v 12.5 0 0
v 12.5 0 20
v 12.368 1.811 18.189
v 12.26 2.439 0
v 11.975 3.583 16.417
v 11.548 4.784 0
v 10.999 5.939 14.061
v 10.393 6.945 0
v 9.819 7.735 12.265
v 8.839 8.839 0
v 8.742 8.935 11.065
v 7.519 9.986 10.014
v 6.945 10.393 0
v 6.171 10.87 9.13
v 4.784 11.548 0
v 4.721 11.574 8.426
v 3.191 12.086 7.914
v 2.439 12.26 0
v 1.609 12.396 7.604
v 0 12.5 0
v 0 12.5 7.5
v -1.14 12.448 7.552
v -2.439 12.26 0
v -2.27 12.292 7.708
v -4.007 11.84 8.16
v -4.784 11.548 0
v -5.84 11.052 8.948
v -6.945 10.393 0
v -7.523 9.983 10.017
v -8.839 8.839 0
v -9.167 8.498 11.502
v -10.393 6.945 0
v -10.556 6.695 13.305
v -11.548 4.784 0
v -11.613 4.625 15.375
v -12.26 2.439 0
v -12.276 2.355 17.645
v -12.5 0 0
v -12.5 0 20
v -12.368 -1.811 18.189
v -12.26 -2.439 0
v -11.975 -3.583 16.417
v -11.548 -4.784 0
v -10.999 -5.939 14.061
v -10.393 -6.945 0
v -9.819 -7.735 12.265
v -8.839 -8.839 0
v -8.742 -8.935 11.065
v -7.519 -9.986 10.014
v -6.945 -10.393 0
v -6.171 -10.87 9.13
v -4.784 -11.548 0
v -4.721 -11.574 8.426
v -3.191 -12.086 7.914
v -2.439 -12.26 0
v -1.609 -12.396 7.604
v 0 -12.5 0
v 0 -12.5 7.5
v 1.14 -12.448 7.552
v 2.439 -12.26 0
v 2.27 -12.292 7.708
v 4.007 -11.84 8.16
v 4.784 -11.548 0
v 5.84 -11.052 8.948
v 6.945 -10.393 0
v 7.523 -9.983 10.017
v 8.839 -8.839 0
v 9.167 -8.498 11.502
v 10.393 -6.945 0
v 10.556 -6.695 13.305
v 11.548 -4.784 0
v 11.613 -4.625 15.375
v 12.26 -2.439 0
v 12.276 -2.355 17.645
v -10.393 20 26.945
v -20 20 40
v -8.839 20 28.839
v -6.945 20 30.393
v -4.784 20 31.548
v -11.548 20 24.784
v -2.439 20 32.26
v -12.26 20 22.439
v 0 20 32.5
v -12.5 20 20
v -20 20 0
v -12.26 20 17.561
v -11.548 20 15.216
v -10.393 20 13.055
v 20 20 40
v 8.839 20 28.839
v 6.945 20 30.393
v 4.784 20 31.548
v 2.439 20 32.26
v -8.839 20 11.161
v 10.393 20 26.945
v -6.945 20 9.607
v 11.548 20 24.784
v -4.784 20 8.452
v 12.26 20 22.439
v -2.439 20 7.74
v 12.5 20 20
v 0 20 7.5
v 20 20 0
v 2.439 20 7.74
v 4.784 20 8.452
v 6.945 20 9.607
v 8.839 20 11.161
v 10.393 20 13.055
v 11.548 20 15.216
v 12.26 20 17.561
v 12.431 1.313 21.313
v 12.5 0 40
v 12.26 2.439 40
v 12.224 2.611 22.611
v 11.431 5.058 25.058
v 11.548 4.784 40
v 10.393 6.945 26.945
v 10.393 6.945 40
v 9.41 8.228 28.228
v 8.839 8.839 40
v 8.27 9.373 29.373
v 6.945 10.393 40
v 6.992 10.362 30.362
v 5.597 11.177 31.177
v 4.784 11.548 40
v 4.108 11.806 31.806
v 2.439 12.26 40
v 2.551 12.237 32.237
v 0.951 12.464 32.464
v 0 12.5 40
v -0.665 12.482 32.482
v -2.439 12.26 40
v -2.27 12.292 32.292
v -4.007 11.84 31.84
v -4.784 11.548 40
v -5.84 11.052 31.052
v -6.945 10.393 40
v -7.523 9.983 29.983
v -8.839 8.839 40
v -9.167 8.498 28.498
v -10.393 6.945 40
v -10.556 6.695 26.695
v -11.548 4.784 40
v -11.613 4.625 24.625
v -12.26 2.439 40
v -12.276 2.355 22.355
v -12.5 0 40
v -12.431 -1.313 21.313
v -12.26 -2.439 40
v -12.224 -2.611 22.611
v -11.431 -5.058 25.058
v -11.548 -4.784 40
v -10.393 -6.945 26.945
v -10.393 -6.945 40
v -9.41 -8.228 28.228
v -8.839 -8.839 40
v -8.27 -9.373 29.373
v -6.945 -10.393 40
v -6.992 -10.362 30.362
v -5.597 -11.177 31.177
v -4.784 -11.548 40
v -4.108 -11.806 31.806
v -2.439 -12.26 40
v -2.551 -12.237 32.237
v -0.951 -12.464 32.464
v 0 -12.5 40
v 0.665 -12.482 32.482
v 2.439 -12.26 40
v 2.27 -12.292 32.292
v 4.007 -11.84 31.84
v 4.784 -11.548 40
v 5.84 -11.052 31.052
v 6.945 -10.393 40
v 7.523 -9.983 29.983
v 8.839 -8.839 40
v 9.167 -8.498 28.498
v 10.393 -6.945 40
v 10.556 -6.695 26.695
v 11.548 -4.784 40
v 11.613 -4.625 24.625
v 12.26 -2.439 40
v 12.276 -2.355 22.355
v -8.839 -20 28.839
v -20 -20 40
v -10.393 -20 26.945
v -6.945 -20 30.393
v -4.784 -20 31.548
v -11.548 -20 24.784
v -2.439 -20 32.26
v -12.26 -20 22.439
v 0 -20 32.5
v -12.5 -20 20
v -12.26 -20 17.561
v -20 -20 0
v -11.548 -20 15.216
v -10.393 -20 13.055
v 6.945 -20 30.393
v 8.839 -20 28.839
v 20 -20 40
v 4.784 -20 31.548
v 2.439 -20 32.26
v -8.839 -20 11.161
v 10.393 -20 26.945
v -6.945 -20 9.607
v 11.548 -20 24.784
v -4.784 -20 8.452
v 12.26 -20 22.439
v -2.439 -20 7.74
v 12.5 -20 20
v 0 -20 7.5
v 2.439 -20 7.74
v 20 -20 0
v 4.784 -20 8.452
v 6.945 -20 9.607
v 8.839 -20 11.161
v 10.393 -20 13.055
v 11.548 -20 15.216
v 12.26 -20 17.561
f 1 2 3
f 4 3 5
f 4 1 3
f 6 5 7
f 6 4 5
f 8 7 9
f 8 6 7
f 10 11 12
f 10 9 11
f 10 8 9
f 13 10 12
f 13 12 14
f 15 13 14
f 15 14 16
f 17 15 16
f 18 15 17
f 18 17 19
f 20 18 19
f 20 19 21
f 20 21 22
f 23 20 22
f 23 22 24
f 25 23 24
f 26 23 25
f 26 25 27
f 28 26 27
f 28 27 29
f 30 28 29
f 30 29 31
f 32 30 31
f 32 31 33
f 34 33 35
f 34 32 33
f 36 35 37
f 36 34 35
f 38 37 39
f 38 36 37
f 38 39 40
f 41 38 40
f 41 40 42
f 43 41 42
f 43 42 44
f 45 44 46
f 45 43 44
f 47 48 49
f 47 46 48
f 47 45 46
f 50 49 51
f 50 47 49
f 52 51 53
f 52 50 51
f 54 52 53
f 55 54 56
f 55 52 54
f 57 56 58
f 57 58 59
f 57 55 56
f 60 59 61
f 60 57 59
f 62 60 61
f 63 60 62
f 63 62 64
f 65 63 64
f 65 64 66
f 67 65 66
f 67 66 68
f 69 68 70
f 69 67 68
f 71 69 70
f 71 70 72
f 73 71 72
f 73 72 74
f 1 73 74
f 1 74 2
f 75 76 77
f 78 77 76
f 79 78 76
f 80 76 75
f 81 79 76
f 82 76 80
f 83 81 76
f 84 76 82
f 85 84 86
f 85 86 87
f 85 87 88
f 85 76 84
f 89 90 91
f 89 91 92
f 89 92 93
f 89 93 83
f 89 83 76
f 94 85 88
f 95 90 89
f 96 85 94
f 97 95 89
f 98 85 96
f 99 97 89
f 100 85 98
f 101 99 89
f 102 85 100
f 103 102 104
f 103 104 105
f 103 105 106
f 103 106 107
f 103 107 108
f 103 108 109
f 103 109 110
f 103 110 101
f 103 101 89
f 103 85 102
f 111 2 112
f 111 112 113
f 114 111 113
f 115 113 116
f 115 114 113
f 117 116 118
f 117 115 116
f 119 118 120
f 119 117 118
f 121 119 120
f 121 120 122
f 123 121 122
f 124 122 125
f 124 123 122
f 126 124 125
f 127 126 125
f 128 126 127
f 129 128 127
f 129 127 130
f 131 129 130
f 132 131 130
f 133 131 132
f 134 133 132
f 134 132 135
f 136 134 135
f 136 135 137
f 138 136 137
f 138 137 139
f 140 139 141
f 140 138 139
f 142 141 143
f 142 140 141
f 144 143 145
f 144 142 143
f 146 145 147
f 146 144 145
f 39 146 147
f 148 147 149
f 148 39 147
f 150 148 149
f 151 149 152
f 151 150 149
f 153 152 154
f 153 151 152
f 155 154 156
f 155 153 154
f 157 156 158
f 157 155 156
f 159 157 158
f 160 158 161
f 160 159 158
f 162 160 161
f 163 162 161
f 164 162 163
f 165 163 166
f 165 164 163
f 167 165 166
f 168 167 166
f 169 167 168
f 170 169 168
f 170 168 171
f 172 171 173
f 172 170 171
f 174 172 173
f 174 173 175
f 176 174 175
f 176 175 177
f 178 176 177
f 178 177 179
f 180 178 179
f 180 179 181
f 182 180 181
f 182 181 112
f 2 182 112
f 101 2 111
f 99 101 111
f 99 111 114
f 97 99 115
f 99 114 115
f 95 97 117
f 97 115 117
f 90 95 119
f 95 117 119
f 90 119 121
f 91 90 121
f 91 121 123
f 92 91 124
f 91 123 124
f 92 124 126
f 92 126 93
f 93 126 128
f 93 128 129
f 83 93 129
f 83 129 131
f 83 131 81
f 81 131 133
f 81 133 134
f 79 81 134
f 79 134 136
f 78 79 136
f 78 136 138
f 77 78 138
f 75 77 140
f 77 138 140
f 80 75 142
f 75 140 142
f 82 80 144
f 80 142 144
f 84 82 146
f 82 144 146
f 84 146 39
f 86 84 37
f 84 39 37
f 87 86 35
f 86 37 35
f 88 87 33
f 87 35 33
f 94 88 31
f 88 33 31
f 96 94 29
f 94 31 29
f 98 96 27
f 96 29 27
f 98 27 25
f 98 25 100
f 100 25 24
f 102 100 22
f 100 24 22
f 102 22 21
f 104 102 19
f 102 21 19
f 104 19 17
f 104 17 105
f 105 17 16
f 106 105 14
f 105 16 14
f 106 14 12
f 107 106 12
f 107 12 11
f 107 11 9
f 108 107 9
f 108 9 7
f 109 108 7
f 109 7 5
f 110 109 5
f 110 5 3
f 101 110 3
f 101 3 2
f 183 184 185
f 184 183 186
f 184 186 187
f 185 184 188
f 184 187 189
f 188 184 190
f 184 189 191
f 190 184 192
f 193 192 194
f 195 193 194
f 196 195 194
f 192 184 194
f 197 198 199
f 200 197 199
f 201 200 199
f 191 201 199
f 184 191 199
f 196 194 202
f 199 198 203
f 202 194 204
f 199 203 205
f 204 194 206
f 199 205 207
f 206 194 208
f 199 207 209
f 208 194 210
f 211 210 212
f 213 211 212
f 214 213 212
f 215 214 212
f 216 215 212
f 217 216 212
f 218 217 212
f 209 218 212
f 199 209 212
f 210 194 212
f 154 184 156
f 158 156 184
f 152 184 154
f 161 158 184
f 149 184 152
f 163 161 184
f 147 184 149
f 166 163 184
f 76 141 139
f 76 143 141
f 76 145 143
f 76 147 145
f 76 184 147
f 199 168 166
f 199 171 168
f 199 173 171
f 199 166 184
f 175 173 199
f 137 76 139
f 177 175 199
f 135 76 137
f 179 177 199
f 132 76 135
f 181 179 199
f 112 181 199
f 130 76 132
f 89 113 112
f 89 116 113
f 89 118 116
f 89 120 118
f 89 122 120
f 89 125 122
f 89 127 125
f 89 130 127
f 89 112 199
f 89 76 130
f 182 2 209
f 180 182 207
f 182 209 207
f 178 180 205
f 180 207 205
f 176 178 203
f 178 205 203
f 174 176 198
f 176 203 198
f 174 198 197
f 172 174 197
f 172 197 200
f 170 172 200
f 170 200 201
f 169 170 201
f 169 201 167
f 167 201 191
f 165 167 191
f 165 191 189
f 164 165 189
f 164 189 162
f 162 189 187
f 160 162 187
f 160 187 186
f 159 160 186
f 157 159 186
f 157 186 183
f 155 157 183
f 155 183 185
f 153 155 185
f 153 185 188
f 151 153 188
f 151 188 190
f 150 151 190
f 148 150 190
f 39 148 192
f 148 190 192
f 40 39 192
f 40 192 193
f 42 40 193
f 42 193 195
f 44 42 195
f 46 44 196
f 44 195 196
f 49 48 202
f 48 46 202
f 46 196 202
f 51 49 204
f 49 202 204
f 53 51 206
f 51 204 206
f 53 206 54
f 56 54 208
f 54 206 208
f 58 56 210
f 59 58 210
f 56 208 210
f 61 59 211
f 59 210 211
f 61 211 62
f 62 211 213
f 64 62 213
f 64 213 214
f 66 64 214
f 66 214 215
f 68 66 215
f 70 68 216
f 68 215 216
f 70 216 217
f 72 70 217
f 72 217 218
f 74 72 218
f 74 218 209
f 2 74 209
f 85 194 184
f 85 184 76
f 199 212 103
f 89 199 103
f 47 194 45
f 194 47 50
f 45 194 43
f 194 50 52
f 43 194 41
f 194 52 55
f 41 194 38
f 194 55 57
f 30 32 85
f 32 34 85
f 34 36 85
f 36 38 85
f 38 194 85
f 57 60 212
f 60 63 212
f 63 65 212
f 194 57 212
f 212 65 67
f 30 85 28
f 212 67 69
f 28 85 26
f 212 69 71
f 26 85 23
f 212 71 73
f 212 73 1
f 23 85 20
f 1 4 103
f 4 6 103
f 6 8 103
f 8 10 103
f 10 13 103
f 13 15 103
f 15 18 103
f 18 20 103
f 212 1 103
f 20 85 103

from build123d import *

# Parameters (mm, degrees)
F0_W     = 40
F0_H     = 40
F0_R     = 12.5
F1_DEPTH = 40
F2_R     = 12.5
F3_DEPTH = 40.001


with BuildPart() as f1:
    # F0 (on Top) → F1 (new body)
    with BuildSketch(Plane.XY):
        Rectangle(F0_W, F0_H)
        Circle(F0_R, mode=Mode.SUBTRACT)
    extrude(amount=F1_DEPTH)

    # F2 (on face) → F3 (cut, through all)
    with BuildSketch(Plane.XZ.offset(20)):
        with Locations((0, 20)):
            Circle(F2_R)
    extrude(amount=-F3_DEPTH, mode=Mode.SUBTRACT)


solid = f1.part
